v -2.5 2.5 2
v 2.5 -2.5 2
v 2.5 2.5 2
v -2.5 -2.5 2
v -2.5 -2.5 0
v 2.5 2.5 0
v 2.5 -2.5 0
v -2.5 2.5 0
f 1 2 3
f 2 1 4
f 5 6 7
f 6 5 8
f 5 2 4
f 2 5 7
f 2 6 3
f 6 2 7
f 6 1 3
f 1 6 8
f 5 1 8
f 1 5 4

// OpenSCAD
// plate 1x1

// external vars #########################

ext_scale = 1.0;

// part ##################################

scale([ext_scale,ext_scale,ext_scale])
translate([-2.5,-2.5,0])
cube([5,5,2]);
